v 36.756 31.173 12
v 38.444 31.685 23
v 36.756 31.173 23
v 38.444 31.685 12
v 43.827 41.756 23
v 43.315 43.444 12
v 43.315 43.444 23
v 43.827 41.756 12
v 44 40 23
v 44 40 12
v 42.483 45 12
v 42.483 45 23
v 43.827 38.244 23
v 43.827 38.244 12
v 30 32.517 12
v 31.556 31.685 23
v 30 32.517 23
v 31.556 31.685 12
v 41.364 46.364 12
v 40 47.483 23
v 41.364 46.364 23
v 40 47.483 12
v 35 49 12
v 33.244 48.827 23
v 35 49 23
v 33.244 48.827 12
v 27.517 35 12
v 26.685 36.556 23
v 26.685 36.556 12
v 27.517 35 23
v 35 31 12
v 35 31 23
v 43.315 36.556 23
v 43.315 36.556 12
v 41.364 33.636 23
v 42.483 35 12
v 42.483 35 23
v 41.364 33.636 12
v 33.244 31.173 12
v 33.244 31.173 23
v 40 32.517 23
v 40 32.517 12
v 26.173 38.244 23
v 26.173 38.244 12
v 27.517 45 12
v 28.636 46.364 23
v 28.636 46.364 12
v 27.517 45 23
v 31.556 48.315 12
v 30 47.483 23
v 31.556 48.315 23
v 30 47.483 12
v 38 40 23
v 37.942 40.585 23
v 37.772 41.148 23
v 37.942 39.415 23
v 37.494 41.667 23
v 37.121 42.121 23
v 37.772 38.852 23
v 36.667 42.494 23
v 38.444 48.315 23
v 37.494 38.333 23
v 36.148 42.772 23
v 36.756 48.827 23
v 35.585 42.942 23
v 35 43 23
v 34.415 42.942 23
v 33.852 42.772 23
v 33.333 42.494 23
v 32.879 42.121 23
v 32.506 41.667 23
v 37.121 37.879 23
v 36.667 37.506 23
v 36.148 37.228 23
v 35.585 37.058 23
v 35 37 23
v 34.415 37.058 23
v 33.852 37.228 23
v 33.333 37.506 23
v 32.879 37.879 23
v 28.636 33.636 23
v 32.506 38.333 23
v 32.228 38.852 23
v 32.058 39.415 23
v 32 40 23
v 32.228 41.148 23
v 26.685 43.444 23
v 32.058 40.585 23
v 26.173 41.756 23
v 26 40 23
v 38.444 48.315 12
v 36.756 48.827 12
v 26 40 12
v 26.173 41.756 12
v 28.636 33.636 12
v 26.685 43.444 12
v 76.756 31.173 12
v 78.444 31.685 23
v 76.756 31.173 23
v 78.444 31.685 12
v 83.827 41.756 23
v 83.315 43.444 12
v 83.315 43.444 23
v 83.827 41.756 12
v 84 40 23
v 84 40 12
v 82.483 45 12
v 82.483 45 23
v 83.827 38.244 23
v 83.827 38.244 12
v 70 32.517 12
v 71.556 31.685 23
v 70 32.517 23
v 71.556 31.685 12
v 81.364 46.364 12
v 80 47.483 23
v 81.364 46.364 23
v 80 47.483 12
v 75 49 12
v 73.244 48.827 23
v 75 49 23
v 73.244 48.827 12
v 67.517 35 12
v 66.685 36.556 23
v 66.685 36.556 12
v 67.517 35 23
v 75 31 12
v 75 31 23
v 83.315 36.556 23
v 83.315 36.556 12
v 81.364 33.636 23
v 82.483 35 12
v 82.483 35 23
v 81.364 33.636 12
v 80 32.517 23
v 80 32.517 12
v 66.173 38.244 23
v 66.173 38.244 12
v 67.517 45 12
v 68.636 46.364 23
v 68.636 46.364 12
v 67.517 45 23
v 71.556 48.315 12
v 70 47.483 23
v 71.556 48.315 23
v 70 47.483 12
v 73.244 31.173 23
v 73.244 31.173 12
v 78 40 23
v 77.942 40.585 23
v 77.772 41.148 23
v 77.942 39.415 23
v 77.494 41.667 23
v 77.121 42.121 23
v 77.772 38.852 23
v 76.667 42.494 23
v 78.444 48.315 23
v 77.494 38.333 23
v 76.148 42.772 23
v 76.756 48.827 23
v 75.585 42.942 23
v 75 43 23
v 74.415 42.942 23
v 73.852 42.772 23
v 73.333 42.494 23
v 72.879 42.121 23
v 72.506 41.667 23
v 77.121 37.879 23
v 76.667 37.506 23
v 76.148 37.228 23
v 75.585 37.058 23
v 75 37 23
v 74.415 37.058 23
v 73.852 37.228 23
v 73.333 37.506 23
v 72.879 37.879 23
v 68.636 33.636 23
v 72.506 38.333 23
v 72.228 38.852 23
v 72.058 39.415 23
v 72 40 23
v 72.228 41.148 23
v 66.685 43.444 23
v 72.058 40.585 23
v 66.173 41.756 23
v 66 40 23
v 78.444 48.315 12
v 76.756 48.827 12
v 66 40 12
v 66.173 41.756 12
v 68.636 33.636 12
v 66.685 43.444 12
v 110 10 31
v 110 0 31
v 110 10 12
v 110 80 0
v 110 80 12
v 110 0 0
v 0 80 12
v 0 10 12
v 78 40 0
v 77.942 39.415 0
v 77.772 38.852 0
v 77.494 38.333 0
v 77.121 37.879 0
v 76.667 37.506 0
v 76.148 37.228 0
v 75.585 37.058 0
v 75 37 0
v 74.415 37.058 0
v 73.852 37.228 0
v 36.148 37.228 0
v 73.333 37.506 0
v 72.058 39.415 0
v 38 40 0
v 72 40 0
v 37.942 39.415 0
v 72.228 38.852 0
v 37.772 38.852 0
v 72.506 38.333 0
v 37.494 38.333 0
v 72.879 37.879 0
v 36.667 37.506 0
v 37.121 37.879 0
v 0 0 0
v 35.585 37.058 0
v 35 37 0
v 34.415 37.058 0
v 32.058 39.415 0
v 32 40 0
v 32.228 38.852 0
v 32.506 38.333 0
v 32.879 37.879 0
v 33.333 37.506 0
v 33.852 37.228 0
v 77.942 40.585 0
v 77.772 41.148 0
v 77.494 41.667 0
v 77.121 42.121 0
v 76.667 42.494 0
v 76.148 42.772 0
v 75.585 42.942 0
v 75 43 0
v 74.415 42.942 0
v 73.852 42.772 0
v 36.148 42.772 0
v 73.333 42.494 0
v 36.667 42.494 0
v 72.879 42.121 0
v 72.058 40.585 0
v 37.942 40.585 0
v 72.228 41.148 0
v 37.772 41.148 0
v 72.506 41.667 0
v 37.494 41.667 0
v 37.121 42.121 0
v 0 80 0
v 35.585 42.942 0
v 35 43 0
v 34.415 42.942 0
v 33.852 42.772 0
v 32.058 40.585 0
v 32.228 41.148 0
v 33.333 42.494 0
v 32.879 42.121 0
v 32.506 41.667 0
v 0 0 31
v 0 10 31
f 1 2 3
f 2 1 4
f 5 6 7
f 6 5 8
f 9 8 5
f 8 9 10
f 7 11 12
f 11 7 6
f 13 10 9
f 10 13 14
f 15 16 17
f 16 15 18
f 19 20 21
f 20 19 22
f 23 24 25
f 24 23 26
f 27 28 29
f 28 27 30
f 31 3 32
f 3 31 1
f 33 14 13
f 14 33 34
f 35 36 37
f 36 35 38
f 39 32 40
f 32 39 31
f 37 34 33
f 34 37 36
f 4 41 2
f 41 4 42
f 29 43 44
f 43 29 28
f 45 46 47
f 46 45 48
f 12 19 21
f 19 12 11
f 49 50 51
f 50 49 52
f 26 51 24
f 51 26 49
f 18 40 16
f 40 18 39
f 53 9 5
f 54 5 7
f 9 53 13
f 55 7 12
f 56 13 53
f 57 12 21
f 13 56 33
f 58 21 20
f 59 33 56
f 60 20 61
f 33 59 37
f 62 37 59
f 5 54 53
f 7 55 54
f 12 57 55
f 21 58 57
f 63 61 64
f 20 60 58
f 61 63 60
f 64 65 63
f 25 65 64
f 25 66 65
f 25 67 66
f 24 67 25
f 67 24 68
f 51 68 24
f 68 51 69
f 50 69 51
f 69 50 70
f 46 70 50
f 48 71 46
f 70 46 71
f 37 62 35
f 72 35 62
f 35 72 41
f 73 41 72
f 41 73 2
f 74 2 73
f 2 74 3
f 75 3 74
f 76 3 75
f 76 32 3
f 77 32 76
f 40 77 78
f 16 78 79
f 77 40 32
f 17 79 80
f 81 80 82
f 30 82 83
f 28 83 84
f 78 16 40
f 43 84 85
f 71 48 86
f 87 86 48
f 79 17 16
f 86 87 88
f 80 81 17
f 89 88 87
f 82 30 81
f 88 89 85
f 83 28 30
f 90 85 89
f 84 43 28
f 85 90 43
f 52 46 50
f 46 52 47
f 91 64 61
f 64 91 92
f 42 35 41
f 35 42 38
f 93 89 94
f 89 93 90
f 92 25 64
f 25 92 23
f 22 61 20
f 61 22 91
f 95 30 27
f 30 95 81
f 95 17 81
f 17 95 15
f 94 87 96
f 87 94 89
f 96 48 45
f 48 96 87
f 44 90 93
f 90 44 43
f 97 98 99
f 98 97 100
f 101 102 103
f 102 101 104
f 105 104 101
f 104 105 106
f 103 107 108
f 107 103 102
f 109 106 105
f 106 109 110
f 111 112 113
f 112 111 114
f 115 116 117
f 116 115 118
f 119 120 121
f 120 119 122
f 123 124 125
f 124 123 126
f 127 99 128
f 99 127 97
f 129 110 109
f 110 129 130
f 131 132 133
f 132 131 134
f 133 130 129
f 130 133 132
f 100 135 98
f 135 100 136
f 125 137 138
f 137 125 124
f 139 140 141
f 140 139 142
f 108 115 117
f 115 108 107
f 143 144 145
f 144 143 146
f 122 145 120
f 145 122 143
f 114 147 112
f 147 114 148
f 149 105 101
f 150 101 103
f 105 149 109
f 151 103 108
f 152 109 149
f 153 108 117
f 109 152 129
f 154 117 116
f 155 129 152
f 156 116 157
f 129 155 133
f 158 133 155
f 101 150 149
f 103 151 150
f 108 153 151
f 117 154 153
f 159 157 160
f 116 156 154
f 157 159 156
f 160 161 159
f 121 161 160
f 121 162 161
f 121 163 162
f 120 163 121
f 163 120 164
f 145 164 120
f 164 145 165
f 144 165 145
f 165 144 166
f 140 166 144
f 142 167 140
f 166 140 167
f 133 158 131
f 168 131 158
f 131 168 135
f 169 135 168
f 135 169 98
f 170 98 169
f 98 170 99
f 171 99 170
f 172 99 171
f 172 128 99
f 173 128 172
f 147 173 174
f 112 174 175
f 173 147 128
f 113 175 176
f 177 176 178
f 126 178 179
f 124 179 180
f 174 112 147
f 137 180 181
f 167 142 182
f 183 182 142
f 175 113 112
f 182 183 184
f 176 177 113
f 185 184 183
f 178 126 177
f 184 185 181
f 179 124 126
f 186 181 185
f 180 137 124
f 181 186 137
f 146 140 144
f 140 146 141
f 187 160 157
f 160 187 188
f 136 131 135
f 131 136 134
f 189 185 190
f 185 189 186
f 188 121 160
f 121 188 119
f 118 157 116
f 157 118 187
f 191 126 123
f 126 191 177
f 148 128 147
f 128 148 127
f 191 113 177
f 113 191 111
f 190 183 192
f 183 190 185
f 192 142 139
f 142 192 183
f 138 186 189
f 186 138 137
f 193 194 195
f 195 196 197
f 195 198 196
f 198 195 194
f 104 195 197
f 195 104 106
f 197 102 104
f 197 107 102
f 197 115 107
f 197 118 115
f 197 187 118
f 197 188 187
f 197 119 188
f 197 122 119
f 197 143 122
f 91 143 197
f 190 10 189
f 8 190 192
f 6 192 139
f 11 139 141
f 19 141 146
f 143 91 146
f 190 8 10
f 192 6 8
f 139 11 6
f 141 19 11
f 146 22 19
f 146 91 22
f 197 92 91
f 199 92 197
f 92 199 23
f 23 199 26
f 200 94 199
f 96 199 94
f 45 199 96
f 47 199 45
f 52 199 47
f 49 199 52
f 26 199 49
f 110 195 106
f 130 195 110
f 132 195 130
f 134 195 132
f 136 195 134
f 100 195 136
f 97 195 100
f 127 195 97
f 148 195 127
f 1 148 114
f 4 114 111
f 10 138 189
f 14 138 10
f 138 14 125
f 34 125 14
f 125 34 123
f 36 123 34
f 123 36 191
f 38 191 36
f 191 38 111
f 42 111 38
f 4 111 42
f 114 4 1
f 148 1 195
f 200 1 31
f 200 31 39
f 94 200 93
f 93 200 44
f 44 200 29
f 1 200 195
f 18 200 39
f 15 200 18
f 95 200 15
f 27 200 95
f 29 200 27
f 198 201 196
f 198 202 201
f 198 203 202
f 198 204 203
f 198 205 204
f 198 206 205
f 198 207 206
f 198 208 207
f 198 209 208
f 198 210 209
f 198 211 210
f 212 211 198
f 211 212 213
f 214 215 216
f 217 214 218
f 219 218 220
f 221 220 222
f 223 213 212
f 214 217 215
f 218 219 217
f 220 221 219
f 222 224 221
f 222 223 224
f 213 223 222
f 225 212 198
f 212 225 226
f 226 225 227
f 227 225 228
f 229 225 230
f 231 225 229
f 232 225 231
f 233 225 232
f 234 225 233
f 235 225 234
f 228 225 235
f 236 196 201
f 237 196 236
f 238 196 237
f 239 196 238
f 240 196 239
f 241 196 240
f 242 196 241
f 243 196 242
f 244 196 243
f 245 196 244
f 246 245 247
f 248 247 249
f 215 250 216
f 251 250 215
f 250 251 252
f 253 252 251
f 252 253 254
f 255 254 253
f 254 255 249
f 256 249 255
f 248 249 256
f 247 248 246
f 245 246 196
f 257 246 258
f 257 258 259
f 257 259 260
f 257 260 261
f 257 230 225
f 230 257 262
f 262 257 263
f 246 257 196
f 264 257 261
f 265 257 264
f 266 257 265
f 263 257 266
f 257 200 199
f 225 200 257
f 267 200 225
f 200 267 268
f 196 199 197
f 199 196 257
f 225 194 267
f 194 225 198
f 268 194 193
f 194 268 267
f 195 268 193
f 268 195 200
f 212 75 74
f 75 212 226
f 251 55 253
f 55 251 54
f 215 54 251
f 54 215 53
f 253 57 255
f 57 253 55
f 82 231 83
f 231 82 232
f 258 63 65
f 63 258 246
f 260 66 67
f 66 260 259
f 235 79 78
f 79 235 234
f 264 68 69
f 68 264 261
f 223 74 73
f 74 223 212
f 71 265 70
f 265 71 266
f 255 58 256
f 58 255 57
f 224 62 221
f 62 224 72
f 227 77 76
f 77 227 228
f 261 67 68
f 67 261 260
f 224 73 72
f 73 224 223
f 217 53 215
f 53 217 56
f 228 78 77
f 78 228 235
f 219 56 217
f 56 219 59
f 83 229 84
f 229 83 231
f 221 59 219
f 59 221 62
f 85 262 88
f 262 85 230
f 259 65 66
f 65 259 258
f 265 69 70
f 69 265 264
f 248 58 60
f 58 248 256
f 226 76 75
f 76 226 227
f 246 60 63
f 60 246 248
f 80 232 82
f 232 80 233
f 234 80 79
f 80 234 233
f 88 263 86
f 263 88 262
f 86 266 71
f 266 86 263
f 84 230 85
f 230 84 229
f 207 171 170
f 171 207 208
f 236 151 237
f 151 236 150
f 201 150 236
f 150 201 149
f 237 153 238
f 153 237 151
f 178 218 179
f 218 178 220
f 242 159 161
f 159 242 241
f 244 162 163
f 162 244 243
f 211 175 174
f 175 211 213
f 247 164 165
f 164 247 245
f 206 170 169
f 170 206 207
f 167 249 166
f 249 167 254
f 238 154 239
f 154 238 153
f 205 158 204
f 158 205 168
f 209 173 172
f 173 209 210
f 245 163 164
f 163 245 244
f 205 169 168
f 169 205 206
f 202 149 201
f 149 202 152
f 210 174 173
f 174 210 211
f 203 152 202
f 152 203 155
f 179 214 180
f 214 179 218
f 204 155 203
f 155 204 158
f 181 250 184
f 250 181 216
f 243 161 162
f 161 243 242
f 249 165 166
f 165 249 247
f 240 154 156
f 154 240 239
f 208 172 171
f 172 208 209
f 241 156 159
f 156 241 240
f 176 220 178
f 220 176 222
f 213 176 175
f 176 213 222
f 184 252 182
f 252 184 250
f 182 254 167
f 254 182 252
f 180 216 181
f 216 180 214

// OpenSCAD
$fn = 32;

// ----------------------------------------------------------------------
// Drill jig: fence jig
// ----------------------------------------------------------------------

// --- parameters (mm) ---
plate_l = 110;            // plate length, X
plate_w = 80;             // plate width, Y
plate_t = 12;             // plate thickness
boss_d = 18;              // guide boss diameter
boss_h = 12;              // boss height above the plate
guide_d = 6;              // guide hole diameter
boss_pitch = 40;          // boss pitch
fence_h = 20;             // fence height above the plate
fence_t = 10;             // fence thickness

n_boss = 2;  // guide bosses
boss_x0 = (plate_l - (n_boss - 1) * boss_pitch) / 2;  // first boss X
boss_top = plate_t - 1 + boss_h;  // boss crown height
fence_top = plate_t - 1 + fence_h;  // fence crown height
total_h = max([fence_top, boss_top]);  // overall height

difference() {
  union() {
  cube([plate_l, plate_w, plate_t]);
  for (i = [0 : n_boss - 1])
    translate([boss_x0 + i * boss_pitch, plate_w / 2, plate_t - 1])
      cylinder(h = boss_h, d = boss_d);
  translate([0, 0, plate_t - 1]) cube([plate_l, fence_t, fence_h]);
  }
  for (i = [0 : n_boss - 1])
    translate([boss_x0 + i * boss_pitch, plate_w / 2, -1])
      cylinder(h = plate_t + boss_h, d = guide_d);
}
